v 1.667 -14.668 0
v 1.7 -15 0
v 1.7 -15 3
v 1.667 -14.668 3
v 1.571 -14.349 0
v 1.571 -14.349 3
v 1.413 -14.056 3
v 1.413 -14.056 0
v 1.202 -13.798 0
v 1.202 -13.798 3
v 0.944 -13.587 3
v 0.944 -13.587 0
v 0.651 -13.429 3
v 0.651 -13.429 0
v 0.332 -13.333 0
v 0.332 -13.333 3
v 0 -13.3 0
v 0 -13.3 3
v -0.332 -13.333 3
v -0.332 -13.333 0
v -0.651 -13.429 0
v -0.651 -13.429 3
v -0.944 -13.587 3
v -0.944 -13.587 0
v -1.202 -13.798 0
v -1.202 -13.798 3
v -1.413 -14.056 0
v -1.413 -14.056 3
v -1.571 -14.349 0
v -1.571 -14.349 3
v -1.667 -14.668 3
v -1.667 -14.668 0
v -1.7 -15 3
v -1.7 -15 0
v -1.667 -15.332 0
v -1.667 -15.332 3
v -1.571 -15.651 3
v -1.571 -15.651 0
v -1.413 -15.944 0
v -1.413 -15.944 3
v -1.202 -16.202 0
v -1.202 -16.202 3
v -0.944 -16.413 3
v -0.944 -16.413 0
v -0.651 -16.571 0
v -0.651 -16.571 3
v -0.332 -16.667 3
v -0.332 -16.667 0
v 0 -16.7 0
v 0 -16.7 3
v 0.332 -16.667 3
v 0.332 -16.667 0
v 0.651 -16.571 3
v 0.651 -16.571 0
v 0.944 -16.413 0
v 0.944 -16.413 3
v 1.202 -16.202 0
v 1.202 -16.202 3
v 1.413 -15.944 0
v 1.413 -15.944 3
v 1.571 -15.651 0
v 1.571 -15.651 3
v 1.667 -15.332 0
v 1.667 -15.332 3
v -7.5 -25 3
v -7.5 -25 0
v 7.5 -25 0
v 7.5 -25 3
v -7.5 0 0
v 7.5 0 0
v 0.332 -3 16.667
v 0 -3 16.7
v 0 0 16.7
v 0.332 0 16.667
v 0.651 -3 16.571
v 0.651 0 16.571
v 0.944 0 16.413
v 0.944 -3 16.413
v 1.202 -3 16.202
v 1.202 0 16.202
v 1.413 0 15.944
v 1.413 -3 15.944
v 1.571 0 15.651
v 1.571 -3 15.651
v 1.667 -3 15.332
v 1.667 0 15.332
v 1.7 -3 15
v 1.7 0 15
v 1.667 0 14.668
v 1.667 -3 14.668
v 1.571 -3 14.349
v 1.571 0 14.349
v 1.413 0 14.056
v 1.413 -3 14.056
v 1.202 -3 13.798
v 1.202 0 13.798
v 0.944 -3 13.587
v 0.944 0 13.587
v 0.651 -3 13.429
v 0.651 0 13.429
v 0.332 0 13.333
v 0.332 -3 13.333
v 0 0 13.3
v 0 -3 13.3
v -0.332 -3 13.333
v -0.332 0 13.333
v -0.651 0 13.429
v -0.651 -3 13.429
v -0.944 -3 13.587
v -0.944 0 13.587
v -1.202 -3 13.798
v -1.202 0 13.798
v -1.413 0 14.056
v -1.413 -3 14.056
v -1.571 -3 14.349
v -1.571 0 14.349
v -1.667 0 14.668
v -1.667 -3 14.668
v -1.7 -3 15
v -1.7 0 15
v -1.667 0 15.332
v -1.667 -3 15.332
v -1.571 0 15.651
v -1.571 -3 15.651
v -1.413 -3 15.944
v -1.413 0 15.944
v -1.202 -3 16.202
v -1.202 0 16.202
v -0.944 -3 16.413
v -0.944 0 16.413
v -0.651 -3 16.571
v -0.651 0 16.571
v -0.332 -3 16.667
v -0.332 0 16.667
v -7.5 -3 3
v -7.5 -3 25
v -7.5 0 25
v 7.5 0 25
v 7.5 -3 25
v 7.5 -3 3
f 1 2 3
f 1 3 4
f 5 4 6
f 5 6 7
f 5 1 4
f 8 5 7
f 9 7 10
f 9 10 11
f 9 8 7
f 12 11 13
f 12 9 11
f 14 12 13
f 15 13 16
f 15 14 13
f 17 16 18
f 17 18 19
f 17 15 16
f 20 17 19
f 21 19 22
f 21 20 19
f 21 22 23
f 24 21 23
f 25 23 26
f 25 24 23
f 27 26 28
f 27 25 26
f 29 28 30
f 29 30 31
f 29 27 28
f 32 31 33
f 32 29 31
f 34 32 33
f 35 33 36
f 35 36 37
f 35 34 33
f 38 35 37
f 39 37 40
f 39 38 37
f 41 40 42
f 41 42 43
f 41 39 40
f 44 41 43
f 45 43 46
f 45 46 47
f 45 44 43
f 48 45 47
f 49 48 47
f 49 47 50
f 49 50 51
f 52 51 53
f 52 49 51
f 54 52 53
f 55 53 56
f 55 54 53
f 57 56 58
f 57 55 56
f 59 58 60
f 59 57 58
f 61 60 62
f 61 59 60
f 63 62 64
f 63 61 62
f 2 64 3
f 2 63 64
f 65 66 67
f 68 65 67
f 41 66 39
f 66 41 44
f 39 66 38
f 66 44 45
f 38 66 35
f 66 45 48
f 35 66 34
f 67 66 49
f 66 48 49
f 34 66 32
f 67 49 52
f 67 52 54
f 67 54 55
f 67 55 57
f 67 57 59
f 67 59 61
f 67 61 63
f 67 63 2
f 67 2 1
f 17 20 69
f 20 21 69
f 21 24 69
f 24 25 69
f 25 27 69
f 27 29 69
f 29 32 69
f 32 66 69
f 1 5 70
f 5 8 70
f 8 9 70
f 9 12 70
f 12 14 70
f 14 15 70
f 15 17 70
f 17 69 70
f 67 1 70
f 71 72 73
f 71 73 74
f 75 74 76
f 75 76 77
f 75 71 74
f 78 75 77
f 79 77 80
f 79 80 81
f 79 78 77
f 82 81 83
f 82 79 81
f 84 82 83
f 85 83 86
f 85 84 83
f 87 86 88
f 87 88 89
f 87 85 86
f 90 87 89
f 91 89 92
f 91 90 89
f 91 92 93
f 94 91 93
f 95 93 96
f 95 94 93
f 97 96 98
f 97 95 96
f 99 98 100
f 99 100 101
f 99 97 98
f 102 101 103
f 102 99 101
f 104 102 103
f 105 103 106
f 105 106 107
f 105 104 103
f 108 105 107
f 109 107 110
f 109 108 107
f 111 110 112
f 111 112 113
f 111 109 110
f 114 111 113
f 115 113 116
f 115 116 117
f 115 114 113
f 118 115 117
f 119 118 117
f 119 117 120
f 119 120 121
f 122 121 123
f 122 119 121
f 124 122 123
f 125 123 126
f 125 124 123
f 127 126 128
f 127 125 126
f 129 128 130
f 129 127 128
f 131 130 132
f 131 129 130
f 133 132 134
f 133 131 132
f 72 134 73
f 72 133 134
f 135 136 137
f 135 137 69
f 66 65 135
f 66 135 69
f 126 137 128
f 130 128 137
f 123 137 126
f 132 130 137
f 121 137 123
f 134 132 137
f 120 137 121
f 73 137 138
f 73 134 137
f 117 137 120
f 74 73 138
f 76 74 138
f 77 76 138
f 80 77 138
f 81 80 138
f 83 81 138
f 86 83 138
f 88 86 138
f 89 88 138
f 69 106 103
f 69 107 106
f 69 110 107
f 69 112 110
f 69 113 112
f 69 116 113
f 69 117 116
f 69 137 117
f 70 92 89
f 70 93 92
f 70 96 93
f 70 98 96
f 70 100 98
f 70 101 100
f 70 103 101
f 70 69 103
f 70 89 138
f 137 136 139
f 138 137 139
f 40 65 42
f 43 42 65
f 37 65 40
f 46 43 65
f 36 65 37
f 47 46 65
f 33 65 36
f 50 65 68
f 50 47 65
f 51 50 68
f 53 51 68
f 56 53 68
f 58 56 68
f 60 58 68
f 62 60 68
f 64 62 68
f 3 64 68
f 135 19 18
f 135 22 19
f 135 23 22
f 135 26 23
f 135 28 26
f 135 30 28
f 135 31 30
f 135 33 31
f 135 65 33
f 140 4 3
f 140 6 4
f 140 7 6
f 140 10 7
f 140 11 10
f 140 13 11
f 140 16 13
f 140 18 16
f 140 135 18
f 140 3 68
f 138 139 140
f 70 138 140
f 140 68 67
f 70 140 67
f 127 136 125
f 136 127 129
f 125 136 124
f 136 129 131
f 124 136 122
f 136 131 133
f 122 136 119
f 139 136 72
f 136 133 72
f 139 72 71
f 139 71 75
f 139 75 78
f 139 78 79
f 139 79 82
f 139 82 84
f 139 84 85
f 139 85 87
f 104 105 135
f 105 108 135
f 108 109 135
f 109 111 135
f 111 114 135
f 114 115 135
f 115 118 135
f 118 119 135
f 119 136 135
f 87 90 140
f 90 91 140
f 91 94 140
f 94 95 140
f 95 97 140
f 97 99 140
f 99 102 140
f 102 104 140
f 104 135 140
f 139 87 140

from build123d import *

# Parameters (mm, degrees)
CROQUIS1_W           = 15
CROQUIS1_H           = 25
ALA_HORIZONTAL_DEPTH = 3
ALA_VERTICAL_START   = -3
CROQUIS2_W           = 15
CROQUIS2_H           = 25
ALA_VERTICAL_DEPTH   = 3
CROQUIS3_R           = 1.7
BARRENO_M3_H_DEPTH   = 3
BARRENO_M3_V_START   = -3
CROQUIS4_R           = 1.7
BARRENO_M3_V_DEPTH   = 3


with BuildPart() as part:
    # Croquis1 → Ala_horizontal (new body)
    with BuildSketch(Plane.XY):
        with Locations((0, -12.5)):
            Rectangle(CROQUIS1_W, CROQUIS1_H)
    extrude(amount=ALA_HORIZONTAL_DEPTH)

    # Croquis2 → Ala_vertical (add)
    with BuildSketch(Plane(origin=(0, 0, 0), x_dir=(1, 0, 0), z_dir=(0, 1, 0)).offset(ALA_VERTICAL_START)):
        with Locations((0, -12.5)):
            Rectangle(CROQUIS2_W, CROQUIS2_H)
    extrude(amount=ALA_VERTICAL_DEPTH)

    # Croquis3 → Barreno_M3_h (cut)
    with BuildSketch(Plane.XY):
        with Locations((0, -15)):
            Circle(CROQUIS3_R)
    extrude(amount=BARRENO_M3_H_DEPTH, mode=Mode.SUBTRACT)

    # Croquis4 → Barreno_M3_v (cut)
    with BuildSketch(Plane(origin=(0, 0, 0), x_dir=(1, 0, 0), z_dir=(0, 1, 0)).offset(BARRENO_M3_V_START)):
        with Locations(Location((0, -15, 0), (0, 0, 270))):
            Circle(CROQUIS4_R)
    extrude(amount=BARRENO_M3_V_DEPTH, mode=Mode.SUBTRACT)


solid = part.part
